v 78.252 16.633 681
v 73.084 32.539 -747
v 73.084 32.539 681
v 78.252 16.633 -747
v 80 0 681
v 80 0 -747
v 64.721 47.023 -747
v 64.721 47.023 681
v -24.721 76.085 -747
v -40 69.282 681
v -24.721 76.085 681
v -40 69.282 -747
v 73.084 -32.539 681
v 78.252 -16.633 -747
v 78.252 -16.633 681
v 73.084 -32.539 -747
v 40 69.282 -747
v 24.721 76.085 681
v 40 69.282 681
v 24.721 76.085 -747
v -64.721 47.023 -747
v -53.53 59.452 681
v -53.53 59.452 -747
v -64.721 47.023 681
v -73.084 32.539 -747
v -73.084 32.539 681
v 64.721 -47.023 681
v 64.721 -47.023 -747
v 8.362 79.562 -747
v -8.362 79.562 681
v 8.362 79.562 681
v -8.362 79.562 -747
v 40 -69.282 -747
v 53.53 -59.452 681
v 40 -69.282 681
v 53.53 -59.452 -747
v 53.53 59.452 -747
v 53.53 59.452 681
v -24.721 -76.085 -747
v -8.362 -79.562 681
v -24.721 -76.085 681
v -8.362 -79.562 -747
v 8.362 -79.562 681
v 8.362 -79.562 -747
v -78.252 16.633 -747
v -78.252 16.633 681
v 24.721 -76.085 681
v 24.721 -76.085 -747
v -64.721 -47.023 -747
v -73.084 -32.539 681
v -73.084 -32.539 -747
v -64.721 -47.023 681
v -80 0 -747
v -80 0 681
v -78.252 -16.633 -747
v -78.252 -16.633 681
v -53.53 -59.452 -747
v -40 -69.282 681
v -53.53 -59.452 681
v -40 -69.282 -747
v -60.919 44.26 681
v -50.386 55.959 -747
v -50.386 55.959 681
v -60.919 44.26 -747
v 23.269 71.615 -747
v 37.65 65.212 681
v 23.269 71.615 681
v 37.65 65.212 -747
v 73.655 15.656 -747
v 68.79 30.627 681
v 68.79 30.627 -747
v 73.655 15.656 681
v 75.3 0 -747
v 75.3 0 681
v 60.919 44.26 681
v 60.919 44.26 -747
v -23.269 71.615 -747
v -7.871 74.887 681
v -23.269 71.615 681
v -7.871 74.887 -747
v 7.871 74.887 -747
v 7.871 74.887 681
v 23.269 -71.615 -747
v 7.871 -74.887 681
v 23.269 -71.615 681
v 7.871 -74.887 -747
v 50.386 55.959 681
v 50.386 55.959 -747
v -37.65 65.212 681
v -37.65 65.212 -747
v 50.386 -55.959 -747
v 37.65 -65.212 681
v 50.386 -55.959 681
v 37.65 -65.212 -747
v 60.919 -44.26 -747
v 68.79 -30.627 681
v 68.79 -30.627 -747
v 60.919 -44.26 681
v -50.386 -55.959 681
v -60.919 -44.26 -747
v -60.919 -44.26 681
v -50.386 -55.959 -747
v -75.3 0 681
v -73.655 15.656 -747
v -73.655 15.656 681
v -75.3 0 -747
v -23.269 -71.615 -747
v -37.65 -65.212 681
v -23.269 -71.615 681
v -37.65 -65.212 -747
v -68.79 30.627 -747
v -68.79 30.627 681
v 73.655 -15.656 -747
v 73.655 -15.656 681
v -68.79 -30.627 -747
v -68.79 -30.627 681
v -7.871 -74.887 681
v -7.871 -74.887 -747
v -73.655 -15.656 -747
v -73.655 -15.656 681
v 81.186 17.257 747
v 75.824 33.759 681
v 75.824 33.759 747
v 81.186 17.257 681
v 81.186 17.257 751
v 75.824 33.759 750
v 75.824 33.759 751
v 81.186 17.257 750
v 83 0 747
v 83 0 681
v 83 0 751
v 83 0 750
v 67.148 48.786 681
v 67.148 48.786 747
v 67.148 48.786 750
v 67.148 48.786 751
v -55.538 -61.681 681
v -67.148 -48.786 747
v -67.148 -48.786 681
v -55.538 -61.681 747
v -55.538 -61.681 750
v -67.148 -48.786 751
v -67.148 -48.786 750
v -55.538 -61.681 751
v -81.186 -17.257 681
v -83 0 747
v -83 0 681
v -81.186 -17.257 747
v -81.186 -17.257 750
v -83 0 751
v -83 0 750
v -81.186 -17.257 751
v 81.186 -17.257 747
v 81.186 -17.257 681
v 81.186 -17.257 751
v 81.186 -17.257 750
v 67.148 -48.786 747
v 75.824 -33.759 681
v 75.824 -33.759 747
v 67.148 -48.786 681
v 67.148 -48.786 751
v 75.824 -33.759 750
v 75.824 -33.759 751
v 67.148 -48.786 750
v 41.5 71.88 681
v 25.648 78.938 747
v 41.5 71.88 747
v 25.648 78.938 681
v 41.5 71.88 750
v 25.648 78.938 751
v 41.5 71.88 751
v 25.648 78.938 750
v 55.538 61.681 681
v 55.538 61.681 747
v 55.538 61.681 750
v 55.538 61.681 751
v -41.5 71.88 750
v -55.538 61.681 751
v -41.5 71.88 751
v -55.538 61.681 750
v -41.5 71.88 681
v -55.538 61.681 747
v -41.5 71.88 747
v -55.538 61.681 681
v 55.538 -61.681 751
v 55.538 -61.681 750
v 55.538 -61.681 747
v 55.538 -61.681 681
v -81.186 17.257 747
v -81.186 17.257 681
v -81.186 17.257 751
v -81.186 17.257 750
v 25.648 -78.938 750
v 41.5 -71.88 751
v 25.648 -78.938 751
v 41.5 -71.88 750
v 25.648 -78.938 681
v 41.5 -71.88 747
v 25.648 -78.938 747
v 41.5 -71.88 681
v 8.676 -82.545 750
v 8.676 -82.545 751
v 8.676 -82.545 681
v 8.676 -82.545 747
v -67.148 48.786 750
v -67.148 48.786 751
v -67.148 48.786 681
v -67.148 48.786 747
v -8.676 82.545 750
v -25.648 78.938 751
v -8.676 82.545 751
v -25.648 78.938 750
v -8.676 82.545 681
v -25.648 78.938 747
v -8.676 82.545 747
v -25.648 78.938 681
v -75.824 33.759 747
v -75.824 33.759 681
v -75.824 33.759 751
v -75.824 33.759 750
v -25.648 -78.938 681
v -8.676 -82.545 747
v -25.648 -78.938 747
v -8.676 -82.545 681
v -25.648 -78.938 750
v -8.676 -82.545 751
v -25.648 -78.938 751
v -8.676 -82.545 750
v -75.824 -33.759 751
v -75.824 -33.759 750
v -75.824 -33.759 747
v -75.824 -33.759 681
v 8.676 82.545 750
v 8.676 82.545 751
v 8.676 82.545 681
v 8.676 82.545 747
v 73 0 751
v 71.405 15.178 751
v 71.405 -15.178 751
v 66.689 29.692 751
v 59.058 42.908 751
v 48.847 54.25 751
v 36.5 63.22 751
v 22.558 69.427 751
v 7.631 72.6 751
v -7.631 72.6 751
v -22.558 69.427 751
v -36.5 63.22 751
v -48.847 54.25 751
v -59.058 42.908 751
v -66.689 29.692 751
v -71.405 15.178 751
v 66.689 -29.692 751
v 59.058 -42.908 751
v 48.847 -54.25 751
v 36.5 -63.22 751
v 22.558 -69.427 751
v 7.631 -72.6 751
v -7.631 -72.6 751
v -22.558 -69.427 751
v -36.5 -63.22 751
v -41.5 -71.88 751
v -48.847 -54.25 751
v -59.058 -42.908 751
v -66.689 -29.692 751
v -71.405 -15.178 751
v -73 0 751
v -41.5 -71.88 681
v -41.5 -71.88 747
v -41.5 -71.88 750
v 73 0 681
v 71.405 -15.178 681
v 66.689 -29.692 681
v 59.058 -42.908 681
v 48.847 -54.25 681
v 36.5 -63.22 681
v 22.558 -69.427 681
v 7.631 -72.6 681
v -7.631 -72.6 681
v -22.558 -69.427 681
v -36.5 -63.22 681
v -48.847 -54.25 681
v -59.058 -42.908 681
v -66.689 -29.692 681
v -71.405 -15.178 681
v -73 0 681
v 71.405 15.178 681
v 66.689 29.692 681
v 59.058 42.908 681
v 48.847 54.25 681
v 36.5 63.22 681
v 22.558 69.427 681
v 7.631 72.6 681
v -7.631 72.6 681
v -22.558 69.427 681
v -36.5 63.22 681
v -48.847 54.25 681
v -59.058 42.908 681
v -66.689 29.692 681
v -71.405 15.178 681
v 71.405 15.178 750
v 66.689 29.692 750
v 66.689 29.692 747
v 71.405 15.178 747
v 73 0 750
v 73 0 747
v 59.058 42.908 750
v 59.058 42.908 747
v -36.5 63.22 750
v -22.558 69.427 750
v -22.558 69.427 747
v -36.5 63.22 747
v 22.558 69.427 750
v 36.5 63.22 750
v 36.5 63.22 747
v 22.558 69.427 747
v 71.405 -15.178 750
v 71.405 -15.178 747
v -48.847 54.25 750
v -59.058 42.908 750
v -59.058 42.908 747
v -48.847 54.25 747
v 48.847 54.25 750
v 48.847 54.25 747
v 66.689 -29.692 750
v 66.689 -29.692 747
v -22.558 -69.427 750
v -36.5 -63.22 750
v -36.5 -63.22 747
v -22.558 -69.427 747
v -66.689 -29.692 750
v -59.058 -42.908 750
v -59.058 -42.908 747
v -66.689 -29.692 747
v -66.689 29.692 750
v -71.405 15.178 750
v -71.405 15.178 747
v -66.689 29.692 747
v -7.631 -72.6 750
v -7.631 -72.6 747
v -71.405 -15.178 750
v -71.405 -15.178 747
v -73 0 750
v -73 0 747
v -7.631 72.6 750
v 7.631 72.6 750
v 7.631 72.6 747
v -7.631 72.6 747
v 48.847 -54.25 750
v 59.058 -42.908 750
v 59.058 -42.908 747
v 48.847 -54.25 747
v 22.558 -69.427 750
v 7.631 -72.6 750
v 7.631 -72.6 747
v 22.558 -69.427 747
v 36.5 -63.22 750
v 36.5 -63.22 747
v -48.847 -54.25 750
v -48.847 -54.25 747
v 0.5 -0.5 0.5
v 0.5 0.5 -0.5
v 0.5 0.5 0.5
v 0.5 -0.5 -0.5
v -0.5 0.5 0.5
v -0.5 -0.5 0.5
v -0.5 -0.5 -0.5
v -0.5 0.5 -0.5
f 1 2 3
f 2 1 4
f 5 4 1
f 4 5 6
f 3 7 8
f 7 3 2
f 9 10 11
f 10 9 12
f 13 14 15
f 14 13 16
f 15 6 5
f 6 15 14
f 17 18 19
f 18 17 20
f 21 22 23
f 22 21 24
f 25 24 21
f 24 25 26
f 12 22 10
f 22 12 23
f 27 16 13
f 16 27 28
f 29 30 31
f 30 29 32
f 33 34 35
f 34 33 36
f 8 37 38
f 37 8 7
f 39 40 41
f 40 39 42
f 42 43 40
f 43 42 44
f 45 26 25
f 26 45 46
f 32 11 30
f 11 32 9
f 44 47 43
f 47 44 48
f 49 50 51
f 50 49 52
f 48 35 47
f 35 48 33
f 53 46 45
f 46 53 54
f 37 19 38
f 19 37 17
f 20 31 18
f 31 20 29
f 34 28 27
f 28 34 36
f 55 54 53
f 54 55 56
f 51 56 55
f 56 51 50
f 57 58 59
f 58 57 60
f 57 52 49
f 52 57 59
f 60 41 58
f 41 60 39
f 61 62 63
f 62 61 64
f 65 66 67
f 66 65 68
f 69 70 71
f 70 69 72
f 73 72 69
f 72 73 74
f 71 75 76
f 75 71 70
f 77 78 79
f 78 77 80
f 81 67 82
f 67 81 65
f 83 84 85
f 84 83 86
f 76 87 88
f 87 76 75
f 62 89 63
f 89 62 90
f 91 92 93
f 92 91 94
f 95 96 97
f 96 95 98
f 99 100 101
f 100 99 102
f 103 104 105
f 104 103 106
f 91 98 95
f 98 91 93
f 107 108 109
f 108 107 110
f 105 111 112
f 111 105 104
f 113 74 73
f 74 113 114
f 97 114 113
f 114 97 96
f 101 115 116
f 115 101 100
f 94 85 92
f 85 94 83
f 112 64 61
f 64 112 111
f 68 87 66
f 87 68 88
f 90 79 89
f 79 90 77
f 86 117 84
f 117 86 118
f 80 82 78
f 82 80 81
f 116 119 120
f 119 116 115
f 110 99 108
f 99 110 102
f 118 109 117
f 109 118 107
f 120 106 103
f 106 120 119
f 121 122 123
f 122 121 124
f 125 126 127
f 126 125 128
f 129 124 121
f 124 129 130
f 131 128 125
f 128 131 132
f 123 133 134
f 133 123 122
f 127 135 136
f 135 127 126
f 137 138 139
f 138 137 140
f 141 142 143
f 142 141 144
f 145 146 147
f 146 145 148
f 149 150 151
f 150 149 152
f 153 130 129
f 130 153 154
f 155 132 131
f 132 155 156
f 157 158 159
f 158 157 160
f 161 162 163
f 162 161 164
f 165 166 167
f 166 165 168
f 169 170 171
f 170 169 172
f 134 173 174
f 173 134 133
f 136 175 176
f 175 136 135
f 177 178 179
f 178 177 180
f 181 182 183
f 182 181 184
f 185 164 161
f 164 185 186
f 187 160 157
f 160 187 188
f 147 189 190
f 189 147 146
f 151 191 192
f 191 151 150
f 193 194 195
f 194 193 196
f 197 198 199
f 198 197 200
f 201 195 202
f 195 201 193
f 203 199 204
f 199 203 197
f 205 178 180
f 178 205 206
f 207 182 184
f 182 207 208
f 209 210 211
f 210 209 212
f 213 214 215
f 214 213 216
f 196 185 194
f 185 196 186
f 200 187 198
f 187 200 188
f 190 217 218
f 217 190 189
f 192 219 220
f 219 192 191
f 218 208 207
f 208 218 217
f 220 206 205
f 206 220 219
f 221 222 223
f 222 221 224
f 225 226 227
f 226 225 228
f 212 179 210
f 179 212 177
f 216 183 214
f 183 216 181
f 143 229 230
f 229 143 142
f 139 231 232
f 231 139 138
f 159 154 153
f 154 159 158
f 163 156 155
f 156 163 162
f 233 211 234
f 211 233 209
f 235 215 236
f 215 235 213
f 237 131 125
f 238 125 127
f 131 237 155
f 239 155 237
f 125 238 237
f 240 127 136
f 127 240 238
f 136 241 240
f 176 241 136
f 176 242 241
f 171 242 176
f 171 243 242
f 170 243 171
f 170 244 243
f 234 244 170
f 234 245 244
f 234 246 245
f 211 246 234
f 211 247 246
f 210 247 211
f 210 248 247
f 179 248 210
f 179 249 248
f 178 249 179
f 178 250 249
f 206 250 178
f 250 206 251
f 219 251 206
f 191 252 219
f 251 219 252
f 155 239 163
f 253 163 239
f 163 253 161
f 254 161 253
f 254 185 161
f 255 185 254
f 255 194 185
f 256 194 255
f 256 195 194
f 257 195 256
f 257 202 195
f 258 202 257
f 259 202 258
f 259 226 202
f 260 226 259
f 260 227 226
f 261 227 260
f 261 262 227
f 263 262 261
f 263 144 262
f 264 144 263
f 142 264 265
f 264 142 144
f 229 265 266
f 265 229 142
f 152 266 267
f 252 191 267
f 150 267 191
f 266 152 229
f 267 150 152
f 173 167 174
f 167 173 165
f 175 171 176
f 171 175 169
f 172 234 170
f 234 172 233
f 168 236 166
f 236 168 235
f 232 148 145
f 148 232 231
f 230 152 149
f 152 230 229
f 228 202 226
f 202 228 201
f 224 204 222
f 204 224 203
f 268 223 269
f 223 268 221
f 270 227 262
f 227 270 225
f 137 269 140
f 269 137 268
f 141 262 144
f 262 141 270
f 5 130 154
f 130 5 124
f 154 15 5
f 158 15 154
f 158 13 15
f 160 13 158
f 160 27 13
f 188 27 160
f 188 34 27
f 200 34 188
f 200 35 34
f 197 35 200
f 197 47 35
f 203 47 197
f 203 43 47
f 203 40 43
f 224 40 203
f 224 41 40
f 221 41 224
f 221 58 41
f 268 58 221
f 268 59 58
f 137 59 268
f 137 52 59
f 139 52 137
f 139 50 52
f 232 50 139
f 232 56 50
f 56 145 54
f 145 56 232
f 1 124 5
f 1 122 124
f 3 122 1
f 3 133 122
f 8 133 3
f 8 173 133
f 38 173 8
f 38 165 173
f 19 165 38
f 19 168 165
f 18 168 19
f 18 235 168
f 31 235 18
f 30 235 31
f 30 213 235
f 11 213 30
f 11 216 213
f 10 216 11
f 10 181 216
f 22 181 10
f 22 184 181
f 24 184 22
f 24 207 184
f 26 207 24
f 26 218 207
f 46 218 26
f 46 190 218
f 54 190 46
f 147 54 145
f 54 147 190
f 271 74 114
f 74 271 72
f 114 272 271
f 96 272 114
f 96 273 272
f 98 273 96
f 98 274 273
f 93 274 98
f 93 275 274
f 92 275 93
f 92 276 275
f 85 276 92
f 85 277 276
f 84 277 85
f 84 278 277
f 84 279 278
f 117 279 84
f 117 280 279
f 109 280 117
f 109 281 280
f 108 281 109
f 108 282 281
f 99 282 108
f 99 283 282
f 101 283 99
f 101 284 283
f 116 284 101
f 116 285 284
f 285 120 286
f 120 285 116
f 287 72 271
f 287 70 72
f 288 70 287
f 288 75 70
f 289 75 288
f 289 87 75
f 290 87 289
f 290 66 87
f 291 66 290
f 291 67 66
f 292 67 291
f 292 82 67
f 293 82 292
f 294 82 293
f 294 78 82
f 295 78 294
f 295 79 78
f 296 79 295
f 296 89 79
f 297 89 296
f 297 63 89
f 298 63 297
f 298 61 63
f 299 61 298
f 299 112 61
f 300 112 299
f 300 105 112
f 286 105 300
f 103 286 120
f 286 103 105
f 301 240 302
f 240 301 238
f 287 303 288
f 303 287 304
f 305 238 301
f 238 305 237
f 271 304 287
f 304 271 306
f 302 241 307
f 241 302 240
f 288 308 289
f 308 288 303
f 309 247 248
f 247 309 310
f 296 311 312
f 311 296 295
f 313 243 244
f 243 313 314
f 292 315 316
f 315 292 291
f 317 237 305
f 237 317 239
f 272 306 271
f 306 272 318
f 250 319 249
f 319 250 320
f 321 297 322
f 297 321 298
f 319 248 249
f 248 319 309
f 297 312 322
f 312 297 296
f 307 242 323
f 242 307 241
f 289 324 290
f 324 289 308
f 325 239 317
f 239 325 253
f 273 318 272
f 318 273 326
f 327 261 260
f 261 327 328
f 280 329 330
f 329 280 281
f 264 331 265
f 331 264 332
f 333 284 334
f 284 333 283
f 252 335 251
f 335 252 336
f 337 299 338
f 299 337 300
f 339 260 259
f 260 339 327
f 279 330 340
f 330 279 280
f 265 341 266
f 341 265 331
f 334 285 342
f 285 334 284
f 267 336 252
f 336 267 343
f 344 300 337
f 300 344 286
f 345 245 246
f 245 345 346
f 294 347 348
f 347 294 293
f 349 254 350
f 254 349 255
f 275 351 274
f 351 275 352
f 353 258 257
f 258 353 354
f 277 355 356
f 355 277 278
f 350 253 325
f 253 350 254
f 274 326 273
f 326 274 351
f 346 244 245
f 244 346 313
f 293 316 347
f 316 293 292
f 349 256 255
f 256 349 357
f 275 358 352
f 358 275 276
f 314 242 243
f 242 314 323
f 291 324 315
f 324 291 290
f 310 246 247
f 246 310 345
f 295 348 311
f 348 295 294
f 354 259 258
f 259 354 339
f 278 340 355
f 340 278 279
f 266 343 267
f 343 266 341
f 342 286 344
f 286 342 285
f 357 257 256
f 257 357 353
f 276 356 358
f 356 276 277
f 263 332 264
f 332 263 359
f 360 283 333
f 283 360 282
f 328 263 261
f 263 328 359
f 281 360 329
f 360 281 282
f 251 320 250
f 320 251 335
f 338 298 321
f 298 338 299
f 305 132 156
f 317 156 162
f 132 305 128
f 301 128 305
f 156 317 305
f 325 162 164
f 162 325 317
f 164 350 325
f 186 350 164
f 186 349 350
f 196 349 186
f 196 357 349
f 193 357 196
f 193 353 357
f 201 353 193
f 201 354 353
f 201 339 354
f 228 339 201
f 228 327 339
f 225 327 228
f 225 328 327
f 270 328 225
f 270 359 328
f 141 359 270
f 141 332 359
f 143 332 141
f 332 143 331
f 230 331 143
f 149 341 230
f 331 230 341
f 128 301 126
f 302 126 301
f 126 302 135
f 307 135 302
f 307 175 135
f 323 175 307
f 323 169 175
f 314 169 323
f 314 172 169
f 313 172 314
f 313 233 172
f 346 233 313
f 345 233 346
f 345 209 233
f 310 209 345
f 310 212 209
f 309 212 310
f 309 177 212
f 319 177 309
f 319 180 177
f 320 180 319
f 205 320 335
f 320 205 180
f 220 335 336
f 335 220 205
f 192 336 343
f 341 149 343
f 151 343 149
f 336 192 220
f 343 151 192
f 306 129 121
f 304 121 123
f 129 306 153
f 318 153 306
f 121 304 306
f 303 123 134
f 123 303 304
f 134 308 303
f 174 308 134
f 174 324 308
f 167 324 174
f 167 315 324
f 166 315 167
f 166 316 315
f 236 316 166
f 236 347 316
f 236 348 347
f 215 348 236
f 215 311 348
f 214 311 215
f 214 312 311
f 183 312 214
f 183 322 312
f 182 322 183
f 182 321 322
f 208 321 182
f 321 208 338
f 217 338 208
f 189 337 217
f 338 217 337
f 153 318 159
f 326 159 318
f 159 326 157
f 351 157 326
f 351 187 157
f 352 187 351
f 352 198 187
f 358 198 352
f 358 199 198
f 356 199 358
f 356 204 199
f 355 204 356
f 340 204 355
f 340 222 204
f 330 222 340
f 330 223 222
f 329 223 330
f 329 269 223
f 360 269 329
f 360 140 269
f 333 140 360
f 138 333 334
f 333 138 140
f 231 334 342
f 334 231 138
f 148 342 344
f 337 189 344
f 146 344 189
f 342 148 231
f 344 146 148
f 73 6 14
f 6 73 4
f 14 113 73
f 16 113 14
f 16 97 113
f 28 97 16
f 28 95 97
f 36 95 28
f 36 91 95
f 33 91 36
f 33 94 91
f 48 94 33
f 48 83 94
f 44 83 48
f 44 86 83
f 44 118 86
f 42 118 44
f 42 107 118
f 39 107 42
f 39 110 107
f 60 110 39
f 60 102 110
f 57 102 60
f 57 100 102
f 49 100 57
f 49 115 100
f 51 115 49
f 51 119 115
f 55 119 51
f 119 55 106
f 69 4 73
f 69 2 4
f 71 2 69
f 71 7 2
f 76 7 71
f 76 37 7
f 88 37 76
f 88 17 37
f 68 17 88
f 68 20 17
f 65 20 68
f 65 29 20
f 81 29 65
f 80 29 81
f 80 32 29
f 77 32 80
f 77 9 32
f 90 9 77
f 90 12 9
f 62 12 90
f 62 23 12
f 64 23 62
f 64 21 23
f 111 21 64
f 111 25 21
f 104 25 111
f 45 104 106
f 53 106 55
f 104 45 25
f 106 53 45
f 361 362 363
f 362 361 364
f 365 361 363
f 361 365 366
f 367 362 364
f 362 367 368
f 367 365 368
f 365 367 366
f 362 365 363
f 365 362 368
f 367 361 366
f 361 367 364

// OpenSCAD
// Parameters
pipe_length = 1500; //[750:3000:1]
outer_diameter = 160; //[80:320:1]
wall_thickness = 4.7; //[2.35:9.4:0.1]
socket_length = 70; //[35:140:1]
socket_wall_extra = 2.3; //[1.0:5.0:0.1]
socket_od_extra = 6; //[2:15:0.5]
chamfer_length = 3; //[1:8:0.5]
chamfer_radial = 2; //[0.5:6:0.5]
overlap = 1; //[0.5:2:0.5]

// Base Shapes
module pipe_body() {
  translate([0, 0, 0])
    cylinder(h=pipe_length, r=outer_diameter/2, center=true);
}

module pipe_bore() {
  translate([0, 0, 0])
    cylinder(h=pipe_length + 2*overlap, r=outer_diameter/2 - wall_thickness, center=true);
}

module socket_end() {
  translate([0, 0, pipe_length/2 - socket_length/2 + overlap])
    cylinder(h=socket_length, r=outer_diameter/2 + socket_od_extra/2, center=true);
}

module socket_bore() {
  translate([0, 0, pipe_length/2 - socket_length/2 + overlap])
    cylinder(h=socket_length + 2*overlap, r=outer_diameter/2 - (wall_thickness + socket_wall_extra), center=true);
}

module chamfer_cut_socket_end() {
  translate([0, 0, pipe_length/2 - chamfer_length/2])
    cylinder(h=chamfer_length, r1=outer_diameter/2 + socket_od_extra/2 + chamfer_radial, r2=outer_diameter/2 + socket_od_extra/2, center=true);
}

module chamfer_cut_plain_end() {
  translate([0, 0, -pipe_length/2 + chamfer_length/2])
    cylinder(h=chamfer_length, r1=outer_diameter/2 + chamfer_radial, r2=outer_diameter/2, center=true);
}

module markings_text() {
  translate([0, 0, 0])
    cube([overlap, overlap, overlap], center=true);
}

// Operations
module pipe_shell() {
  difference() {
    pipe_body();
    pipe_bore();
  }
}

module pipe_with_socket_outer() {
  union() {
    pipe_shell();
    socket_end();
  }
}

module pipe_with_socket_hollow() {
  difference() {
    pipe_with_socket_outer();
    socket_bore();
  }
}

module chamfer_edges() {
  difference() {
    pipe_with_socket_hollow();
    chamfer_cut_socket_end();
    chamfer_cut_plain_end();
  }
}

module complete_model() {
  union() {
    chamfer_edges();
    markings_text();
  }
}

// Final Output
complete_model();
